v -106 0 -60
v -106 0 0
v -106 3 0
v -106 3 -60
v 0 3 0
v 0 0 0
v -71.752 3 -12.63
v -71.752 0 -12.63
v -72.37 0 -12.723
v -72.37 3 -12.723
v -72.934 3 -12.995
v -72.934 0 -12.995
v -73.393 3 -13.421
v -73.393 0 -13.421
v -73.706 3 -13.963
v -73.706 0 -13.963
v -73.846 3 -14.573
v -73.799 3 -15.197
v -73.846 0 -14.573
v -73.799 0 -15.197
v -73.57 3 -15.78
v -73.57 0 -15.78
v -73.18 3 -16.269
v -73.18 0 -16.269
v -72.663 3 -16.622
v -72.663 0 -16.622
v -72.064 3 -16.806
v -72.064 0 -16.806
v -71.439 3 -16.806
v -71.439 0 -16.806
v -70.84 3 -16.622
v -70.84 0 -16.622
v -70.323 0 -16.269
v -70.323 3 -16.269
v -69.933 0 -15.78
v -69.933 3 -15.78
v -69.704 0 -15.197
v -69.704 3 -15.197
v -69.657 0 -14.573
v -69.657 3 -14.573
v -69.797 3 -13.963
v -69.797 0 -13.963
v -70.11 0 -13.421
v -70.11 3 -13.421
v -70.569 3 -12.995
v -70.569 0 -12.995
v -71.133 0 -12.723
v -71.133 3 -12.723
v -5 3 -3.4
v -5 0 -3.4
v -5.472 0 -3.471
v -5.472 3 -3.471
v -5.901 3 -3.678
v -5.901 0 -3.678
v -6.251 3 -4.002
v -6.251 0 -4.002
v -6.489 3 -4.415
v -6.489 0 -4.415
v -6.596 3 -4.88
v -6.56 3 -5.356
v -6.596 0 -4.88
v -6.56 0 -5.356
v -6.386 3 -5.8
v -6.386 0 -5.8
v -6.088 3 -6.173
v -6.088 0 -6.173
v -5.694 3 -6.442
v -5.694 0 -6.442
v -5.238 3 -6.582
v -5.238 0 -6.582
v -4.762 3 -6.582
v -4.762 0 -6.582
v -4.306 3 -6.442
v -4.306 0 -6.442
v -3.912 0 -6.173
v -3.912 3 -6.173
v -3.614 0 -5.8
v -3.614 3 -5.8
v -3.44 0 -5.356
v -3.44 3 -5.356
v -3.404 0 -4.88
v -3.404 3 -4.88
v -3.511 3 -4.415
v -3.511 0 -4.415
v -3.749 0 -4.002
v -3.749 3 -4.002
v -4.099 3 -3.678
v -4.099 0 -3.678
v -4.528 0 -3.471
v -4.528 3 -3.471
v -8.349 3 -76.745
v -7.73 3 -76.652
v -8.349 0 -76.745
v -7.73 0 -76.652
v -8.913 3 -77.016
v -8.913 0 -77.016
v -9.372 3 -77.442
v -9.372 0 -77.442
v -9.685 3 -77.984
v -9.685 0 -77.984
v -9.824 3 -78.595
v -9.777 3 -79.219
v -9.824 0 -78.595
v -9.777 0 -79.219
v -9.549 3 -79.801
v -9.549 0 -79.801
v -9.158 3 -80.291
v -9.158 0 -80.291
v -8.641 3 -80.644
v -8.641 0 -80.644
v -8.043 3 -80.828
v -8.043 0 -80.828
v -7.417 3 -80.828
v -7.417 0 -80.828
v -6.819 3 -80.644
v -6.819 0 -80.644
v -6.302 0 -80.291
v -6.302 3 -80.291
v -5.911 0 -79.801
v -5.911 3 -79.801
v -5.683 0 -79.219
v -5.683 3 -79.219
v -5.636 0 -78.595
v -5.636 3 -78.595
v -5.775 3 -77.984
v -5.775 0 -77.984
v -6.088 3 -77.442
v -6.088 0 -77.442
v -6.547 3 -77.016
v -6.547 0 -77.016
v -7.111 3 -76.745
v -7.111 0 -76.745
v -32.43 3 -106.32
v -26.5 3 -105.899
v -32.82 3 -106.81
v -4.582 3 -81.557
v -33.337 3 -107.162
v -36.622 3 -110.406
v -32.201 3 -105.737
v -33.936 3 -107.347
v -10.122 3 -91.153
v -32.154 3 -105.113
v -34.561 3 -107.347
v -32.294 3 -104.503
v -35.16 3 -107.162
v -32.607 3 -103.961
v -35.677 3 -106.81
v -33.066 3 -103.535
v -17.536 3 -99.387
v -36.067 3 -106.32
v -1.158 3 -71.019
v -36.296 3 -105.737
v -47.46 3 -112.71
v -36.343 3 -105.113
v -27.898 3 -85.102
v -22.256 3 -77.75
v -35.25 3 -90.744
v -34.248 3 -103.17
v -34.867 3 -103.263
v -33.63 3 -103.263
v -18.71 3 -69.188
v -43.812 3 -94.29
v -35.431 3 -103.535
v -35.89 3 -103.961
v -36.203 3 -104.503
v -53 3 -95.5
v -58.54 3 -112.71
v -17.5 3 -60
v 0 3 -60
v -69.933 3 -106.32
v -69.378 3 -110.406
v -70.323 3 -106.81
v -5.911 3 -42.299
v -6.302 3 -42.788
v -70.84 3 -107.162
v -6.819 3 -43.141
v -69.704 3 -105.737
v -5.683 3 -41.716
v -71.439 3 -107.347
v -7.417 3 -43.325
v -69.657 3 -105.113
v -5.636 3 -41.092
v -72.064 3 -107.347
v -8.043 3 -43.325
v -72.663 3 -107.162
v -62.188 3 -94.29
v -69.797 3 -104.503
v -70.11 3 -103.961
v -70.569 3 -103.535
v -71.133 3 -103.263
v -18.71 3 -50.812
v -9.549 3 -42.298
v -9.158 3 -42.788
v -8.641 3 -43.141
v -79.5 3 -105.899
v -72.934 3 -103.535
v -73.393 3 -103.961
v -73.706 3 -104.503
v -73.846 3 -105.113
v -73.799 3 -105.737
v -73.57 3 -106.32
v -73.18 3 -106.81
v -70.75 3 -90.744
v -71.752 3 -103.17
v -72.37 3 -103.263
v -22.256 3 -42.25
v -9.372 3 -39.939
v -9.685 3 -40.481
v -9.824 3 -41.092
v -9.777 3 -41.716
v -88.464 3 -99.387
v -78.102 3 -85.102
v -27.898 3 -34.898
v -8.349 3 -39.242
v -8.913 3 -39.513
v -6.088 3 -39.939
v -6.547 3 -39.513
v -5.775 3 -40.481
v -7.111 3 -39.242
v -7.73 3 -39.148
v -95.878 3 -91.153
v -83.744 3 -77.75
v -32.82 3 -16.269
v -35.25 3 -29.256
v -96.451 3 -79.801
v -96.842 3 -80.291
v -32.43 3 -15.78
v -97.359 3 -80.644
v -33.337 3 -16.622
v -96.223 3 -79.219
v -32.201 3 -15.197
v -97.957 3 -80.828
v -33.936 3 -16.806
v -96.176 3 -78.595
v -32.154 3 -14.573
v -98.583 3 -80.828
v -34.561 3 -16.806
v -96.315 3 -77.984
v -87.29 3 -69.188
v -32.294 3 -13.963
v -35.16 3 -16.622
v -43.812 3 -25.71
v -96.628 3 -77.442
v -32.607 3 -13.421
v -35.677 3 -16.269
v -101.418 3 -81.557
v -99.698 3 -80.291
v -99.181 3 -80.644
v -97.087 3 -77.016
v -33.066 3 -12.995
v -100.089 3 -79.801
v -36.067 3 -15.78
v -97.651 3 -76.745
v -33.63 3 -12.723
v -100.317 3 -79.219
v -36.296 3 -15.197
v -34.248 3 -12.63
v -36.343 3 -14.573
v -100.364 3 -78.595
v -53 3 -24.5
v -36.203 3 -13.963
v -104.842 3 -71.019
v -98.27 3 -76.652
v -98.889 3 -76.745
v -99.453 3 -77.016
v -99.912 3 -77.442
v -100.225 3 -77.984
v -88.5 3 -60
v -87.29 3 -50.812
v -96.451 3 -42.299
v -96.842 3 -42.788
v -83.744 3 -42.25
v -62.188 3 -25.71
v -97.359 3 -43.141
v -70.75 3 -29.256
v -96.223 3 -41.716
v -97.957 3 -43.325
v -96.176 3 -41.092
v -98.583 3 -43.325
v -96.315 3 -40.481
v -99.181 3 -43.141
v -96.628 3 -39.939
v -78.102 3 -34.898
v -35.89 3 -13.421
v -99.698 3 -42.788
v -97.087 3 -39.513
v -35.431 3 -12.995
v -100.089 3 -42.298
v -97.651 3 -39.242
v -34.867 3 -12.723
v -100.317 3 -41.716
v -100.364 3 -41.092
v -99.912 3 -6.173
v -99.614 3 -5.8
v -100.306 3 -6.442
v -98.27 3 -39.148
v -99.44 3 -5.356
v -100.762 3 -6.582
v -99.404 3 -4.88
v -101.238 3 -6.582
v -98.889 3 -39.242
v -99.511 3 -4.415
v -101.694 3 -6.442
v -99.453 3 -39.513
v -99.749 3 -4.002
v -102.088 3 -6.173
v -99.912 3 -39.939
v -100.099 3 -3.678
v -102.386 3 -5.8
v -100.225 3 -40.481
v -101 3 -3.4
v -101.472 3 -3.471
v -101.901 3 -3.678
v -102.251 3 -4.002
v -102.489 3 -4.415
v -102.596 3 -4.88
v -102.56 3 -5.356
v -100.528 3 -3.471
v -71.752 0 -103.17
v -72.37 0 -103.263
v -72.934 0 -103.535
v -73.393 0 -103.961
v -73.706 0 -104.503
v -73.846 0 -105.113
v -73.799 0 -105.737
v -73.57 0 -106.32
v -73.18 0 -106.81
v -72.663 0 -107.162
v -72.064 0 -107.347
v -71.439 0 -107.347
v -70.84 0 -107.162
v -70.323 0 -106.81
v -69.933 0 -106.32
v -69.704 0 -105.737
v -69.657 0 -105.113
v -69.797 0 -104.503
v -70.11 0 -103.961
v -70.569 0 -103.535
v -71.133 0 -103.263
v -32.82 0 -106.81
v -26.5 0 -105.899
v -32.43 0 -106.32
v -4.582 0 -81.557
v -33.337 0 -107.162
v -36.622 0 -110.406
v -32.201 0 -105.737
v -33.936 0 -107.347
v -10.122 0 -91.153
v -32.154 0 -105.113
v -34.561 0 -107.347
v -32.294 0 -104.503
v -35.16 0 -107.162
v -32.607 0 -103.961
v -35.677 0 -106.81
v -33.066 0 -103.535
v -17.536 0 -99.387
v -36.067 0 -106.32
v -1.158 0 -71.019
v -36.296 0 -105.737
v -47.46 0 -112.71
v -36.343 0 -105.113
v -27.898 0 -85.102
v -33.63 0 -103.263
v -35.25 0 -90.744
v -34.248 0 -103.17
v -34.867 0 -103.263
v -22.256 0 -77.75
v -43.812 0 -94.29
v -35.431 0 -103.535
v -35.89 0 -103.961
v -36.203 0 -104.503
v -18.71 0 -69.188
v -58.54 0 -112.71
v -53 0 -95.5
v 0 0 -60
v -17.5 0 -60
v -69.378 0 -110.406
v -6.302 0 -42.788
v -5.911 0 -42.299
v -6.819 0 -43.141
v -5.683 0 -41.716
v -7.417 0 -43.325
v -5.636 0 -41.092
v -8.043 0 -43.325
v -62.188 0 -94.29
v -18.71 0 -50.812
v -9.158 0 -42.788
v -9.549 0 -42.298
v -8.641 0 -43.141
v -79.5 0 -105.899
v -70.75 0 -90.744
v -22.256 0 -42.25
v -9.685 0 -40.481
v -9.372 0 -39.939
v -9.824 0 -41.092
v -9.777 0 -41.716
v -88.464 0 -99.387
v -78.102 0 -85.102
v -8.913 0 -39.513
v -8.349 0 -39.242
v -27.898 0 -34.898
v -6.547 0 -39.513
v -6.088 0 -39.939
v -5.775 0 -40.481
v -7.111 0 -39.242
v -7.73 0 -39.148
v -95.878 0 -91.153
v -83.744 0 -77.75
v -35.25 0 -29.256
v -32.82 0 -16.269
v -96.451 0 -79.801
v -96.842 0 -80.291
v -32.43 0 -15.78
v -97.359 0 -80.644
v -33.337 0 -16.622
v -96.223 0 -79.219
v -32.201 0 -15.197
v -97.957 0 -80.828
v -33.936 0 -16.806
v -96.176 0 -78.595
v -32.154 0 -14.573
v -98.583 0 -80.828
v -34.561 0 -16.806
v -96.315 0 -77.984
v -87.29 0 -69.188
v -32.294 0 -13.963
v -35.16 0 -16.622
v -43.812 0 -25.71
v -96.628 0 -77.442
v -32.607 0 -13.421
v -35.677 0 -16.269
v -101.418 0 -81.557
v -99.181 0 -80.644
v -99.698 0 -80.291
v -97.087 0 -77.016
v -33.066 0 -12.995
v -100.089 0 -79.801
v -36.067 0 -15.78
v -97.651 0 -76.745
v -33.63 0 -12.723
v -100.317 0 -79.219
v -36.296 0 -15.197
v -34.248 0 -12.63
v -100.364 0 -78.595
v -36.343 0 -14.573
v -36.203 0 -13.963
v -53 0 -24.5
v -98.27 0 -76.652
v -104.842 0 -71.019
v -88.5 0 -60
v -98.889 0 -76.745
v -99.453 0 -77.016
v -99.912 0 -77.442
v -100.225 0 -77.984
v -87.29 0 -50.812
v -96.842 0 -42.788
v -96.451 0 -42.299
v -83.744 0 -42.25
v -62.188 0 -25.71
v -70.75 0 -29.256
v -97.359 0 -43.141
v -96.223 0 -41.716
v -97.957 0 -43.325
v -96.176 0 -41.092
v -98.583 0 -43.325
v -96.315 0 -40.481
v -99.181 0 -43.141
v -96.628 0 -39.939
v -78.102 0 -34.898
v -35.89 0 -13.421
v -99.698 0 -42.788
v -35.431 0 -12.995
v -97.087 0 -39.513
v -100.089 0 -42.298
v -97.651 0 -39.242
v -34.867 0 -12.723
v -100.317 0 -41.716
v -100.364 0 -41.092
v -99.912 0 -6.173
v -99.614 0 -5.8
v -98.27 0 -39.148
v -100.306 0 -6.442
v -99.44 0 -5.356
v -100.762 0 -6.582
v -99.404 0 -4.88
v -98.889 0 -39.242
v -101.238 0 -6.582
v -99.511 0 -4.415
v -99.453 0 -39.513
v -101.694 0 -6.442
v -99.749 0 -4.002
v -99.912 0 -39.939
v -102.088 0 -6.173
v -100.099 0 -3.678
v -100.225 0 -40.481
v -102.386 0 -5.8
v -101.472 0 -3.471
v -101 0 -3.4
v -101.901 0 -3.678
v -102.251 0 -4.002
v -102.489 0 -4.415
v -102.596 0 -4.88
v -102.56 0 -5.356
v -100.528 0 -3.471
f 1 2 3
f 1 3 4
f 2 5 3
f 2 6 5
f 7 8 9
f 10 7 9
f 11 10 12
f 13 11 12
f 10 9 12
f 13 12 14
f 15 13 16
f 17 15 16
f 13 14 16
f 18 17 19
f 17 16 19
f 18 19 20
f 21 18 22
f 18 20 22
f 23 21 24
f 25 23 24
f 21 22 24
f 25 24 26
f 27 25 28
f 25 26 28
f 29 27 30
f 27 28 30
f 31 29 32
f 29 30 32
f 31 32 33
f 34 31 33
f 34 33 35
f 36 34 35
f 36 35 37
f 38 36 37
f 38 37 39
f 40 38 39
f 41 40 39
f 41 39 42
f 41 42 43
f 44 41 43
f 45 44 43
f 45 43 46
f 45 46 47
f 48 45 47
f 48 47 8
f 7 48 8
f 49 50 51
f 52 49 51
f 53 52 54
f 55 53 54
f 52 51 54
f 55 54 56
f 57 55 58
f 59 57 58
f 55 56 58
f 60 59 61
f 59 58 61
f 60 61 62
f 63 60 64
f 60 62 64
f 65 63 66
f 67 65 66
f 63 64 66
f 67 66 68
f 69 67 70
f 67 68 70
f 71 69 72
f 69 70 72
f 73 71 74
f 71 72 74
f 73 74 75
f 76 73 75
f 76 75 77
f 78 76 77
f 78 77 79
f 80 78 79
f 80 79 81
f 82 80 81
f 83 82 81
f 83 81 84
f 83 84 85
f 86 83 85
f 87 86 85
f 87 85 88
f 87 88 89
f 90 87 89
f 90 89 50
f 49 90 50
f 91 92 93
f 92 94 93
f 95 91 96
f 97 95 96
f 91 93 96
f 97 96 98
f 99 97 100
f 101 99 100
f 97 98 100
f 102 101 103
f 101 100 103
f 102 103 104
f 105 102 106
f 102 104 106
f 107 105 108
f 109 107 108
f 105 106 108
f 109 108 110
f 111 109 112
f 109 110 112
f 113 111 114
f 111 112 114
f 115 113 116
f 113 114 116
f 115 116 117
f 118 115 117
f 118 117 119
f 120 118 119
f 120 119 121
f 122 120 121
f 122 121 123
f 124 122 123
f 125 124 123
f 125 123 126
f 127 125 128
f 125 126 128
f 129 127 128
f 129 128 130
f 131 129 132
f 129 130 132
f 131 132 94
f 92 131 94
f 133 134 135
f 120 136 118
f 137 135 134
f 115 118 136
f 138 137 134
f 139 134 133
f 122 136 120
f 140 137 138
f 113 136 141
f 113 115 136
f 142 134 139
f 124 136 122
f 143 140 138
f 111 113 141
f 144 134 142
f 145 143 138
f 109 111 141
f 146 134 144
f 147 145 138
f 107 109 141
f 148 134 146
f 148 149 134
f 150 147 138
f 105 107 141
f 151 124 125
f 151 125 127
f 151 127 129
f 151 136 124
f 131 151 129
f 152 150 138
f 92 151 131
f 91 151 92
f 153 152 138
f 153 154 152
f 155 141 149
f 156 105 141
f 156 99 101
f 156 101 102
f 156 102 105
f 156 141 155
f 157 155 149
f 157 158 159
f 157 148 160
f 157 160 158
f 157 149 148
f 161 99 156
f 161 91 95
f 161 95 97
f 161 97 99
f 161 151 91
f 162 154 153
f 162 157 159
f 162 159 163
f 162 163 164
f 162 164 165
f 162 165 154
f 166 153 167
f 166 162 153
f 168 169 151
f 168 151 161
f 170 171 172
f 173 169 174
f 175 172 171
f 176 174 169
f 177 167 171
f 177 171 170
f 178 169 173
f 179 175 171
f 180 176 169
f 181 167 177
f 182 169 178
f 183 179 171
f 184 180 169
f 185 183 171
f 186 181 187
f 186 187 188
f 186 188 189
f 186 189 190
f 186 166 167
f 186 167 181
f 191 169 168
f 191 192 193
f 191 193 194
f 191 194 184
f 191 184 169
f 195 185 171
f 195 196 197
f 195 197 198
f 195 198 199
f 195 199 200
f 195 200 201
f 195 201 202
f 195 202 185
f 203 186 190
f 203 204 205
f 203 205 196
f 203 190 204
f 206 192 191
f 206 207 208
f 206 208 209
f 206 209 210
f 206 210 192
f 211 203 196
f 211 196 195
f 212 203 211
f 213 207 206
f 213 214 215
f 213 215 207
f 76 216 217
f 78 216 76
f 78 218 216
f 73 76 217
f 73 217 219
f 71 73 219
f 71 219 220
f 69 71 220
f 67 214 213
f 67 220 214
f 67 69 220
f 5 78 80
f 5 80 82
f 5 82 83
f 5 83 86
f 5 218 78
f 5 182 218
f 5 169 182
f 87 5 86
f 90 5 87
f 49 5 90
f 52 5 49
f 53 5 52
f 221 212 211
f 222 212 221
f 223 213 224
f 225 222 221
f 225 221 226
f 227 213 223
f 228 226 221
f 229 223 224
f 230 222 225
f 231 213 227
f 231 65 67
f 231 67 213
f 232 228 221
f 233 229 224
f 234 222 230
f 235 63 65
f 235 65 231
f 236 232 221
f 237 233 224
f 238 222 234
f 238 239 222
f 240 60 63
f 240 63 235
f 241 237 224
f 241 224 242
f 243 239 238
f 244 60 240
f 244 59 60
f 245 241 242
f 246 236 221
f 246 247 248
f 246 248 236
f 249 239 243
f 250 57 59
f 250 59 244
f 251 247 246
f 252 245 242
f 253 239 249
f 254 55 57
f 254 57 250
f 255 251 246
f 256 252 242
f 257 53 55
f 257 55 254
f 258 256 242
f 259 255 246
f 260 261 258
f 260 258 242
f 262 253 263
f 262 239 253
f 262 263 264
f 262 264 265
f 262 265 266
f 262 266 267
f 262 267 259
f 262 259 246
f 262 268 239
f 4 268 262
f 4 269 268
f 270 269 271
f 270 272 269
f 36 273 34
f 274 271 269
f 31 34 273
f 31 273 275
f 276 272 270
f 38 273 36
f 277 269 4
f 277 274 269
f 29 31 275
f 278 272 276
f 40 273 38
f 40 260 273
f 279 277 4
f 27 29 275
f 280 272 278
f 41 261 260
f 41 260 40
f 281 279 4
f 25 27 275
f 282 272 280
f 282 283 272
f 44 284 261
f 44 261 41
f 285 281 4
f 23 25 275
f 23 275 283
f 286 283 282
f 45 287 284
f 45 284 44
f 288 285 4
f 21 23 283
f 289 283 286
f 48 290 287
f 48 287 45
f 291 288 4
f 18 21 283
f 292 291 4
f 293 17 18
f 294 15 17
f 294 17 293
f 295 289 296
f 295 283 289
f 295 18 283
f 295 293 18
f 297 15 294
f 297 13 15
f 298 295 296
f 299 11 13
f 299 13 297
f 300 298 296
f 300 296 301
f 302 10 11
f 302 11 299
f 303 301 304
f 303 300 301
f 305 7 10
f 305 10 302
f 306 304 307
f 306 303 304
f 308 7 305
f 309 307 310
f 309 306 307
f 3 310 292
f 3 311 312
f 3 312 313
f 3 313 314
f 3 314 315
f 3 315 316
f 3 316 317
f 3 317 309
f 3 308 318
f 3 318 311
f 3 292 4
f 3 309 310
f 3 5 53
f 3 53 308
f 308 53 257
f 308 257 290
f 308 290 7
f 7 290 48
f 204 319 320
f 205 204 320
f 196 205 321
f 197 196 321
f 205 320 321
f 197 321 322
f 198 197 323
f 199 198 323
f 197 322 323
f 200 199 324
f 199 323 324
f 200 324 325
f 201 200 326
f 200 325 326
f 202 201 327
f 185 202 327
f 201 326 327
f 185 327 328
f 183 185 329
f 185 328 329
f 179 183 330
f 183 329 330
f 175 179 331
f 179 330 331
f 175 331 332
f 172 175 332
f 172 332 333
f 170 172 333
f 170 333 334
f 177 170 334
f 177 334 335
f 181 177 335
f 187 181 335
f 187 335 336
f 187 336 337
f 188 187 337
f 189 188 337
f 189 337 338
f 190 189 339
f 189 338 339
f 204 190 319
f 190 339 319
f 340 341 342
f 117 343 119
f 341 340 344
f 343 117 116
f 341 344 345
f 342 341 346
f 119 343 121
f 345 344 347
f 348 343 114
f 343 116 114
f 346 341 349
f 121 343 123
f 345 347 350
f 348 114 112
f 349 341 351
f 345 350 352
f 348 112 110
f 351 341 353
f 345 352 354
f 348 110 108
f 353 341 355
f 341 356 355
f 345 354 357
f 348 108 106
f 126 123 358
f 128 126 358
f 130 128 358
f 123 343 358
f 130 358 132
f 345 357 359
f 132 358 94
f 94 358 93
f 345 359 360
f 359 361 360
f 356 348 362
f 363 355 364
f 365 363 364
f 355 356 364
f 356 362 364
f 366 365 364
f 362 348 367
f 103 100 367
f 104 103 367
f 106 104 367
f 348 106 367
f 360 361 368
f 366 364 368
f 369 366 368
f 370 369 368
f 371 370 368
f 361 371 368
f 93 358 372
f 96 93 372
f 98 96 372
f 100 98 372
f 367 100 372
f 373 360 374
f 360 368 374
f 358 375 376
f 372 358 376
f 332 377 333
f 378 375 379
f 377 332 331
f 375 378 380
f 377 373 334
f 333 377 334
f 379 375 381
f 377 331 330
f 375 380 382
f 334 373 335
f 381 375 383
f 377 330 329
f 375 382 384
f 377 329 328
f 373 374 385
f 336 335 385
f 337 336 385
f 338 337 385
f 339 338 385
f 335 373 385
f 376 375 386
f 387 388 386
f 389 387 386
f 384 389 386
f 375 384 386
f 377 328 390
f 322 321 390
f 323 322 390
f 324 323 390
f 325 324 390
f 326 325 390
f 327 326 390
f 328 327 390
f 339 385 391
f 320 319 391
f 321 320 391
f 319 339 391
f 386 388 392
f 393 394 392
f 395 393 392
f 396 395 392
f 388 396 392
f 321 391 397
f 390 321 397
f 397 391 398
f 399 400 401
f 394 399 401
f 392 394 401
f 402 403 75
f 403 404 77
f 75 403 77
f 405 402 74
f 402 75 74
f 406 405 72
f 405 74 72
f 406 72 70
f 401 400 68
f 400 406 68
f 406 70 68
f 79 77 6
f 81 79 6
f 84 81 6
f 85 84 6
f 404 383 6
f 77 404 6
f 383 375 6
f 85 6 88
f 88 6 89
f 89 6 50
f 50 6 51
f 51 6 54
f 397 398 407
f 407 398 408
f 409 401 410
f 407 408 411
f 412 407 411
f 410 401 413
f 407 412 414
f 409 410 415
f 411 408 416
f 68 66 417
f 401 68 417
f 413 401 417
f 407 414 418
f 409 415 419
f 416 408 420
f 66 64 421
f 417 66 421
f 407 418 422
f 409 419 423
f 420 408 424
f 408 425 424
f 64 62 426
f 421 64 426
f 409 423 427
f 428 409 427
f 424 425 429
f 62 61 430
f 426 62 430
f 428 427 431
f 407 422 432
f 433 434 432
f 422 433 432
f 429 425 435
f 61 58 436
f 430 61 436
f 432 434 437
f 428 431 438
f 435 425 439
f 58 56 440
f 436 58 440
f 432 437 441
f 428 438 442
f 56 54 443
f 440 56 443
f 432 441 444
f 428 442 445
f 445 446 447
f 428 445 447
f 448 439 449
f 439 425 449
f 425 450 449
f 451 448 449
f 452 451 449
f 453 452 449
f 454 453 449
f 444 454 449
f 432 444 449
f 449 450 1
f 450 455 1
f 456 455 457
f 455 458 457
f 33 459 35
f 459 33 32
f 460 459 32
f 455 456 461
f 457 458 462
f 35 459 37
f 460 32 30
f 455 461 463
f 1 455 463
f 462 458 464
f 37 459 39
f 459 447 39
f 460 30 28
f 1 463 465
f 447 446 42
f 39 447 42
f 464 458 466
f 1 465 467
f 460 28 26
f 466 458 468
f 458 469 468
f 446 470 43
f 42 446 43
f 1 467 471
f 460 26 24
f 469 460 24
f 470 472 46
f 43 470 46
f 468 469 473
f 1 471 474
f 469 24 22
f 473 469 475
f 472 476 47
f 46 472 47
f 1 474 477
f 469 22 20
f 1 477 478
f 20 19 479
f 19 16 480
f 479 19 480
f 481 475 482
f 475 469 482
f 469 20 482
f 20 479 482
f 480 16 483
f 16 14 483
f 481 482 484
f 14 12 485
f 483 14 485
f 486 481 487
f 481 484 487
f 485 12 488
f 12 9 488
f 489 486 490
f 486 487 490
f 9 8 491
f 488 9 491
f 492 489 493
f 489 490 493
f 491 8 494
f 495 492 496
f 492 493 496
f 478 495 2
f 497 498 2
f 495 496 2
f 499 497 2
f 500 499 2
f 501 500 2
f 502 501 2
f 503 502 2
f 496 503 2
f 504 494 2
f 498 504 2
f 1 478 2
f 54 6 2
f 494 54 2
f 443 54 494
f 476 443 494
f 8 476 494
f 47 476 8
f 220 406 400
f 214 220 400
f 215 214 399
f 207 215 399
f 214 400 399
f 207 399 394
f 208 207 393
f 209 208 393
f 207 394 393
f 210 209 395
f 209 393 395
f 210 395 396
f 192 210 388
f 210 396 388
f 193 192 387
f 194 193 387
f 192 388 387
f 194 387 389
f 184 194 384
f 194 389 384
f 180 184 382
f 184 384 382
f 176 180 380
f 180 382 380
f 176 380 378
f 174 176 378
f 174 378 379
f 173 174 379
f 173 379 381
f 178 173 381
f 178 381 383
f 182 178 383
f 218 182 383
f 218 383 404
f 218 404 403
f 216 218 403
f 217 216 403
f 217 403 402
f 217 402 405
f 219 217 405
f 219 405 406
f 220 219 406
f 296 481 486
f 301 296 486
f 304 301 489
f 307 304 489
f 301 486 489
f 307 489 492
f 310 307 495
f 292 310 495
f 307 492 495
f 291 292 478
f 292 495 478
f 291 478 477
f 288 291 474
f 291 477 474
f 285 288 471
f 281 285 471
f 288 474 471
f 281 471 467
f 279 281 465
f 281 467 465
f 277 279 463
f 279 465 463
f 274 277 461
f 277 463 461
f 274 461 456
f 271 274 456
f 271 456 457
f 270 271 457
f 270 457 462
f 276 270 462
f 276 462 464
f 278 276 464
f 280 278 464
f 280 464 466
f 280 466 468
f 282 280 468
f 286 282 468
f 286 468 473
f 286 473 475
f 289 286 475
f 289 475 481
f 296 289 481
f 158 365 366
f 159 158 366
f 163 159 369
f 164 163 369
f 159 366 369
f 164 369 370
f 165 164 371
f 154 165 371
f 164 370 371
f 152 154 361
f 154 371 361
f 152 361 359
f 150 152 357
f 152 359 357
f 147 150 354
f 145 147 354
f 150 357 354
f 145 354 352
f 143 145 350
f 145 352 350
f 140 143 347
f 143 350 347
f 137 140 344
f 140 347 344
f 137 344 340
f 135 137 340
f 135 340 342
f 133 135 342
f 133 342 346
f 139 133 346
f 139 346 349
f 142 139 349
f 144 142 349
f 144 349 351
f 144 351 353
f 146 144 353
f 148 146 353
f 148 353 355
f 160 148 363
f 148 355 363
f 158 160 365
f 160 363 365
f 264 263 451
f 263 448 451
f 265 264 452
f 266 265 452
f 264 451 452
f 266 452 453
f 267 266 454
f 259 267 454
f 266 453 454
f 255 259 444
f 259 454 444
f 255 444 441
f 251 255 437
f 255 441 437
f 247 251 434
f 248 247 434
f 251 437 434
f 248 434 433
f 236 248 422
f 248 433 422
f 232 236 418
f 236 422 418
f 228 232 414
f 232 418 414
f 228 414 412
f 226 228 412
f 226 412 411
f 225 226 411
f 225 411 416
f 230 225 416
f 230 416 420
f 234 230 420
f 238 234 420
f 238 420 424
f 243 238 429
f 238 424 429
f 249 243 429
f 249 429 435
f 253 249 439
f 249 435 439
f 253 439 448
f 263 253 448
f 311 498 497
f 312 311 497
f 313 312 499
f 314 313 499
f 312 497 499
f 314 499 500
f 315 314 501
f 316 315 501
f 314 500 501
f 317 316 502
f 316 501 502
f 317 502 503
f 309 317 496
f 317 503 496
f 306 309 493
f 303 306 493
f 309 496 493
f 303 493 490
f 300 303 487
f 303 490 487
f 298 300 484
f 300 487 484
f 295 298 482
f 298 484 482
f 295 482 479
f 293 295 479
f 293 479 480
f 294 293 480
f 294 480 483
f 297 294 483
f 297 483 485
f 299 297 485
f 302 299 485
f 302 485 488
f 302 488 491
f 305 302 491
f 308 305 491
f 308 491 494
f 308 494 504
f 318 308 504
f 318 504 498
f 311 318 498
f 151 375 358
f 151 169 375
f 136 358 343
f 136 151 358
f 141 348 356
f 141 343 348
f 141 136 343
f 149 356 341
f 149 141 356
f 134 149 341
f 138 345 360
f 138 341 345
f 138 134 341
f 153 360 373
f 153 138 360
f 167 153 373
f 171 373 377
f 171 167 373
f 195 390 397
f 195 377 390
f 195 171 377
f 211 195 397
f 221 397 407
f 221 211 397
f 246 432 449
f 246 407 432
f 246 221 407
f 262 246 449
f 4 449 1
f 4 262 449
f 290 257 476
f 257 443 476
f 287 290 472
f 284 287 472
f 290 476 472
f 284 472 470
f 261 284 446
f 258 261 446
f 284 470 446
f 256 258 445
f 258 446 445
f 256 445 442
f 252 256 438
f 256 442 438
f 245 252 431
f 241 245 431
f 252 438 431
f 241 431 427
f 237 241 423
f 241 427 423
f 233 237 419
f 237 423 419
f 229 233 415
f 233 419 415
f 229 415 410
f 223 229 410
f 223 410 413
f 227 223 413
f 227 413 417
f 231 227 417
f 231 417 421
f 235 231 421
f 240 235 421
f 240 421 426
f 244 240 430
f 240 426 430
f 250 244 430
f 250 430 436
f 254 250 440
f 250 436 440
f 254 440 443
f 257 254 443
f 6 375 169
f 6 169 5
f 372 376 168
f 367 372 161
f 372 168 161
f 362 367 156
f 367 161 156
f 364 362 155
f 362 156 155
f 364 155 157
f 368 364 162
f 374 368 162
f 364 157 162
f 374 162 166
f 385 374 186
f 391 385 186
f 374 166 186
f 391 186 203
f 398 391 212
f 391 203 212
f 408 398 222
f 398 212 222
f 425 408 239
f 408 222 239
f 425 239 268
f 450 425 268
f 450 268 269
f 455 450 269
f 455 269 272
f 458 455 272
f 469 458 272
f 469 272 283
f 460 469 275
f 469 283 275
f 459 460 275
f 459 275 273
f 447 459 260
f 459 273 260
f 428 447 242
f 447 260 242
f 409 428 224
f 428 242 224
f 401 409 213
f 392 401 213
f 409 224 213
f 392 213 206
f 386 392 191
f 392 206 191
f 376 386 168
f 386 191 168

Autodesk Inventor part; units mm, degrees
ref_plane "YZ Plane" through (0, 0, 0) normal (1, 0, 0) x (0, 1, 0)
ref_plane "XZ Plane" through (0, 0, 0) normal (0, 1, 0) x (-1, 0, 0)
ref_plane "XY Plane" through (0, 0, 0) normal (0, 0, 1) x (1, 0, 0)
sketch "スケッチ1" plane through (0, 0, 0) normal (0, 1, 0) x (-1, 0, 0)
  line L0 (0, 0) -> (106, 0)
  line L1 (106, 0) -> (106, -113)
  line L2 (106, -113) -> (0, -113)
  line L3 (0, -113) -> (0, 0)
  dimension "d0" = 106
  dimension "d1" = 113
extrude "押し出し1" add sketch "スケッチ1" along normal blind 3
sketch "スケッチ3" plane through (0, 3, 0) normal (0, 1, 0) x (1, 0, 0)
  line L0 (-106, 113) -> (-106, 0) projected
  line L1 (0, 113) -> (-106, 113) projected
  circle A0 centre (-53, 60) radius 35.5
  line L2 (-106, 0) -> (0, 0) projected
  line L3 (-106, 60) -> (0, 60)
  line L4 (0, 0) -> (0, 113) projected
  circle A1 centre (-53, 60) radius 53
  point P0 (-53, 113)
  point P1 (0, 60)
  point P2 (-106, 60)
  dimension "d17" = 71
  dimension "d49" = 53
  dimension "d50" = 0
  dimension "d52" = 106
extrude "押し出し2" cut sketch "スケッチ3" against normal blind 3 contours L1 A1 L0 | L1 L4 A1 | L3 A0 | A0 L3
sketch "スケッチ4" plane through (0, 3, 0) normal (0, 1, 0) x (1, 0, 0)
  line L0 (-106, 113) -> (-106, 0) projected
  line L1 (-106, 5) -> (0, 5)
  line L2 (0, 0) -> (0, 113) projected
  line L3 (-106, 0) -> (0, 0) projected
  line L4 (0, 113) -> (-106, 113) projected
  line L5 (-106, 0) -> (0, 0) projected
  line L6 (-101, 0) -> (-101, 113)
  line L7 (-5, 113) -> (-5, 0)
  point P0 (-101, 5)
  point P1 (-5, 5)
  dimension "d22" = 5
  dimension "d24" = 5
  dimension "d25" = 5
hole "穴2" at (-101, 3, -5) at (-5, 3, -5) direction (0, -1, 0) diameter 3.2 end through all
sketch "スケッチ5" plane through (0, 3, 0) normal (0, 1, 0) x (1, 0, 0)
  line L0 (-106, 113) -> (-106, 0) projected
  line L1 (-106, 60) -> (0, 60)
  circle A0 centre (-53, 60) radius 49
  line L2 (0, 113) -> (-106, 113) projected
  line L3 (-53, 60) -> (-7.7299, 78.7515)
  point P0 (0, 0)
  point P1 (-34.2485, 105.2701)
  point P2 (-71.7515, 105.2701)
  point P3 (-98.2701, 78.7515)
  point P4 (-98.2701, 41.2485)
  point P5 (-71.7515, 14.7299)
  point P6 (-34.2485, 14.7299)
  point P7 (-7.7299, 41.2485)
  dimension "d35" = 98
  dimension "d36" = 53
  dimension "d37" = 22.5
  dimension "d40" = 360
hole "穴3" at (-7.7299, 3, -78.7515) at (-34.2485, 3, -105.2701) at (-71.7515, 3, -105.2701) at (-98.2701, 3, -78.7515) at (-98.2701, 3, -41.2485) at (-71.7515, 3, -14.7299) at (-34.2485, 3, -14.7299) at (-7.7299, 3, -41.2485) direction (0, -1, 0) diameter 4.2 end through all
equation "\"d47\" = Thickness"
equation "\"BendRadius\" = Thickness"
equation "\"BendReliefWidth\" = Thickness"
equation "\"BendReliefDepth\" = 0.5 * Thickness"
equation "\"CornerReliefSize\" = 4 * Thickness"
equation "\"MinimumRemnant\" = 2 * Thickness"
equation "\"TransitionRadius\" = BendRadius"
equation "\"JacobiRadiusSize\" = BendRadius"
equation "\"GapSize\" = Thickness"
equation "\"Thickness\" = 0.5"
properties part number "link2_plate1" material "アルミニウム 6061"
